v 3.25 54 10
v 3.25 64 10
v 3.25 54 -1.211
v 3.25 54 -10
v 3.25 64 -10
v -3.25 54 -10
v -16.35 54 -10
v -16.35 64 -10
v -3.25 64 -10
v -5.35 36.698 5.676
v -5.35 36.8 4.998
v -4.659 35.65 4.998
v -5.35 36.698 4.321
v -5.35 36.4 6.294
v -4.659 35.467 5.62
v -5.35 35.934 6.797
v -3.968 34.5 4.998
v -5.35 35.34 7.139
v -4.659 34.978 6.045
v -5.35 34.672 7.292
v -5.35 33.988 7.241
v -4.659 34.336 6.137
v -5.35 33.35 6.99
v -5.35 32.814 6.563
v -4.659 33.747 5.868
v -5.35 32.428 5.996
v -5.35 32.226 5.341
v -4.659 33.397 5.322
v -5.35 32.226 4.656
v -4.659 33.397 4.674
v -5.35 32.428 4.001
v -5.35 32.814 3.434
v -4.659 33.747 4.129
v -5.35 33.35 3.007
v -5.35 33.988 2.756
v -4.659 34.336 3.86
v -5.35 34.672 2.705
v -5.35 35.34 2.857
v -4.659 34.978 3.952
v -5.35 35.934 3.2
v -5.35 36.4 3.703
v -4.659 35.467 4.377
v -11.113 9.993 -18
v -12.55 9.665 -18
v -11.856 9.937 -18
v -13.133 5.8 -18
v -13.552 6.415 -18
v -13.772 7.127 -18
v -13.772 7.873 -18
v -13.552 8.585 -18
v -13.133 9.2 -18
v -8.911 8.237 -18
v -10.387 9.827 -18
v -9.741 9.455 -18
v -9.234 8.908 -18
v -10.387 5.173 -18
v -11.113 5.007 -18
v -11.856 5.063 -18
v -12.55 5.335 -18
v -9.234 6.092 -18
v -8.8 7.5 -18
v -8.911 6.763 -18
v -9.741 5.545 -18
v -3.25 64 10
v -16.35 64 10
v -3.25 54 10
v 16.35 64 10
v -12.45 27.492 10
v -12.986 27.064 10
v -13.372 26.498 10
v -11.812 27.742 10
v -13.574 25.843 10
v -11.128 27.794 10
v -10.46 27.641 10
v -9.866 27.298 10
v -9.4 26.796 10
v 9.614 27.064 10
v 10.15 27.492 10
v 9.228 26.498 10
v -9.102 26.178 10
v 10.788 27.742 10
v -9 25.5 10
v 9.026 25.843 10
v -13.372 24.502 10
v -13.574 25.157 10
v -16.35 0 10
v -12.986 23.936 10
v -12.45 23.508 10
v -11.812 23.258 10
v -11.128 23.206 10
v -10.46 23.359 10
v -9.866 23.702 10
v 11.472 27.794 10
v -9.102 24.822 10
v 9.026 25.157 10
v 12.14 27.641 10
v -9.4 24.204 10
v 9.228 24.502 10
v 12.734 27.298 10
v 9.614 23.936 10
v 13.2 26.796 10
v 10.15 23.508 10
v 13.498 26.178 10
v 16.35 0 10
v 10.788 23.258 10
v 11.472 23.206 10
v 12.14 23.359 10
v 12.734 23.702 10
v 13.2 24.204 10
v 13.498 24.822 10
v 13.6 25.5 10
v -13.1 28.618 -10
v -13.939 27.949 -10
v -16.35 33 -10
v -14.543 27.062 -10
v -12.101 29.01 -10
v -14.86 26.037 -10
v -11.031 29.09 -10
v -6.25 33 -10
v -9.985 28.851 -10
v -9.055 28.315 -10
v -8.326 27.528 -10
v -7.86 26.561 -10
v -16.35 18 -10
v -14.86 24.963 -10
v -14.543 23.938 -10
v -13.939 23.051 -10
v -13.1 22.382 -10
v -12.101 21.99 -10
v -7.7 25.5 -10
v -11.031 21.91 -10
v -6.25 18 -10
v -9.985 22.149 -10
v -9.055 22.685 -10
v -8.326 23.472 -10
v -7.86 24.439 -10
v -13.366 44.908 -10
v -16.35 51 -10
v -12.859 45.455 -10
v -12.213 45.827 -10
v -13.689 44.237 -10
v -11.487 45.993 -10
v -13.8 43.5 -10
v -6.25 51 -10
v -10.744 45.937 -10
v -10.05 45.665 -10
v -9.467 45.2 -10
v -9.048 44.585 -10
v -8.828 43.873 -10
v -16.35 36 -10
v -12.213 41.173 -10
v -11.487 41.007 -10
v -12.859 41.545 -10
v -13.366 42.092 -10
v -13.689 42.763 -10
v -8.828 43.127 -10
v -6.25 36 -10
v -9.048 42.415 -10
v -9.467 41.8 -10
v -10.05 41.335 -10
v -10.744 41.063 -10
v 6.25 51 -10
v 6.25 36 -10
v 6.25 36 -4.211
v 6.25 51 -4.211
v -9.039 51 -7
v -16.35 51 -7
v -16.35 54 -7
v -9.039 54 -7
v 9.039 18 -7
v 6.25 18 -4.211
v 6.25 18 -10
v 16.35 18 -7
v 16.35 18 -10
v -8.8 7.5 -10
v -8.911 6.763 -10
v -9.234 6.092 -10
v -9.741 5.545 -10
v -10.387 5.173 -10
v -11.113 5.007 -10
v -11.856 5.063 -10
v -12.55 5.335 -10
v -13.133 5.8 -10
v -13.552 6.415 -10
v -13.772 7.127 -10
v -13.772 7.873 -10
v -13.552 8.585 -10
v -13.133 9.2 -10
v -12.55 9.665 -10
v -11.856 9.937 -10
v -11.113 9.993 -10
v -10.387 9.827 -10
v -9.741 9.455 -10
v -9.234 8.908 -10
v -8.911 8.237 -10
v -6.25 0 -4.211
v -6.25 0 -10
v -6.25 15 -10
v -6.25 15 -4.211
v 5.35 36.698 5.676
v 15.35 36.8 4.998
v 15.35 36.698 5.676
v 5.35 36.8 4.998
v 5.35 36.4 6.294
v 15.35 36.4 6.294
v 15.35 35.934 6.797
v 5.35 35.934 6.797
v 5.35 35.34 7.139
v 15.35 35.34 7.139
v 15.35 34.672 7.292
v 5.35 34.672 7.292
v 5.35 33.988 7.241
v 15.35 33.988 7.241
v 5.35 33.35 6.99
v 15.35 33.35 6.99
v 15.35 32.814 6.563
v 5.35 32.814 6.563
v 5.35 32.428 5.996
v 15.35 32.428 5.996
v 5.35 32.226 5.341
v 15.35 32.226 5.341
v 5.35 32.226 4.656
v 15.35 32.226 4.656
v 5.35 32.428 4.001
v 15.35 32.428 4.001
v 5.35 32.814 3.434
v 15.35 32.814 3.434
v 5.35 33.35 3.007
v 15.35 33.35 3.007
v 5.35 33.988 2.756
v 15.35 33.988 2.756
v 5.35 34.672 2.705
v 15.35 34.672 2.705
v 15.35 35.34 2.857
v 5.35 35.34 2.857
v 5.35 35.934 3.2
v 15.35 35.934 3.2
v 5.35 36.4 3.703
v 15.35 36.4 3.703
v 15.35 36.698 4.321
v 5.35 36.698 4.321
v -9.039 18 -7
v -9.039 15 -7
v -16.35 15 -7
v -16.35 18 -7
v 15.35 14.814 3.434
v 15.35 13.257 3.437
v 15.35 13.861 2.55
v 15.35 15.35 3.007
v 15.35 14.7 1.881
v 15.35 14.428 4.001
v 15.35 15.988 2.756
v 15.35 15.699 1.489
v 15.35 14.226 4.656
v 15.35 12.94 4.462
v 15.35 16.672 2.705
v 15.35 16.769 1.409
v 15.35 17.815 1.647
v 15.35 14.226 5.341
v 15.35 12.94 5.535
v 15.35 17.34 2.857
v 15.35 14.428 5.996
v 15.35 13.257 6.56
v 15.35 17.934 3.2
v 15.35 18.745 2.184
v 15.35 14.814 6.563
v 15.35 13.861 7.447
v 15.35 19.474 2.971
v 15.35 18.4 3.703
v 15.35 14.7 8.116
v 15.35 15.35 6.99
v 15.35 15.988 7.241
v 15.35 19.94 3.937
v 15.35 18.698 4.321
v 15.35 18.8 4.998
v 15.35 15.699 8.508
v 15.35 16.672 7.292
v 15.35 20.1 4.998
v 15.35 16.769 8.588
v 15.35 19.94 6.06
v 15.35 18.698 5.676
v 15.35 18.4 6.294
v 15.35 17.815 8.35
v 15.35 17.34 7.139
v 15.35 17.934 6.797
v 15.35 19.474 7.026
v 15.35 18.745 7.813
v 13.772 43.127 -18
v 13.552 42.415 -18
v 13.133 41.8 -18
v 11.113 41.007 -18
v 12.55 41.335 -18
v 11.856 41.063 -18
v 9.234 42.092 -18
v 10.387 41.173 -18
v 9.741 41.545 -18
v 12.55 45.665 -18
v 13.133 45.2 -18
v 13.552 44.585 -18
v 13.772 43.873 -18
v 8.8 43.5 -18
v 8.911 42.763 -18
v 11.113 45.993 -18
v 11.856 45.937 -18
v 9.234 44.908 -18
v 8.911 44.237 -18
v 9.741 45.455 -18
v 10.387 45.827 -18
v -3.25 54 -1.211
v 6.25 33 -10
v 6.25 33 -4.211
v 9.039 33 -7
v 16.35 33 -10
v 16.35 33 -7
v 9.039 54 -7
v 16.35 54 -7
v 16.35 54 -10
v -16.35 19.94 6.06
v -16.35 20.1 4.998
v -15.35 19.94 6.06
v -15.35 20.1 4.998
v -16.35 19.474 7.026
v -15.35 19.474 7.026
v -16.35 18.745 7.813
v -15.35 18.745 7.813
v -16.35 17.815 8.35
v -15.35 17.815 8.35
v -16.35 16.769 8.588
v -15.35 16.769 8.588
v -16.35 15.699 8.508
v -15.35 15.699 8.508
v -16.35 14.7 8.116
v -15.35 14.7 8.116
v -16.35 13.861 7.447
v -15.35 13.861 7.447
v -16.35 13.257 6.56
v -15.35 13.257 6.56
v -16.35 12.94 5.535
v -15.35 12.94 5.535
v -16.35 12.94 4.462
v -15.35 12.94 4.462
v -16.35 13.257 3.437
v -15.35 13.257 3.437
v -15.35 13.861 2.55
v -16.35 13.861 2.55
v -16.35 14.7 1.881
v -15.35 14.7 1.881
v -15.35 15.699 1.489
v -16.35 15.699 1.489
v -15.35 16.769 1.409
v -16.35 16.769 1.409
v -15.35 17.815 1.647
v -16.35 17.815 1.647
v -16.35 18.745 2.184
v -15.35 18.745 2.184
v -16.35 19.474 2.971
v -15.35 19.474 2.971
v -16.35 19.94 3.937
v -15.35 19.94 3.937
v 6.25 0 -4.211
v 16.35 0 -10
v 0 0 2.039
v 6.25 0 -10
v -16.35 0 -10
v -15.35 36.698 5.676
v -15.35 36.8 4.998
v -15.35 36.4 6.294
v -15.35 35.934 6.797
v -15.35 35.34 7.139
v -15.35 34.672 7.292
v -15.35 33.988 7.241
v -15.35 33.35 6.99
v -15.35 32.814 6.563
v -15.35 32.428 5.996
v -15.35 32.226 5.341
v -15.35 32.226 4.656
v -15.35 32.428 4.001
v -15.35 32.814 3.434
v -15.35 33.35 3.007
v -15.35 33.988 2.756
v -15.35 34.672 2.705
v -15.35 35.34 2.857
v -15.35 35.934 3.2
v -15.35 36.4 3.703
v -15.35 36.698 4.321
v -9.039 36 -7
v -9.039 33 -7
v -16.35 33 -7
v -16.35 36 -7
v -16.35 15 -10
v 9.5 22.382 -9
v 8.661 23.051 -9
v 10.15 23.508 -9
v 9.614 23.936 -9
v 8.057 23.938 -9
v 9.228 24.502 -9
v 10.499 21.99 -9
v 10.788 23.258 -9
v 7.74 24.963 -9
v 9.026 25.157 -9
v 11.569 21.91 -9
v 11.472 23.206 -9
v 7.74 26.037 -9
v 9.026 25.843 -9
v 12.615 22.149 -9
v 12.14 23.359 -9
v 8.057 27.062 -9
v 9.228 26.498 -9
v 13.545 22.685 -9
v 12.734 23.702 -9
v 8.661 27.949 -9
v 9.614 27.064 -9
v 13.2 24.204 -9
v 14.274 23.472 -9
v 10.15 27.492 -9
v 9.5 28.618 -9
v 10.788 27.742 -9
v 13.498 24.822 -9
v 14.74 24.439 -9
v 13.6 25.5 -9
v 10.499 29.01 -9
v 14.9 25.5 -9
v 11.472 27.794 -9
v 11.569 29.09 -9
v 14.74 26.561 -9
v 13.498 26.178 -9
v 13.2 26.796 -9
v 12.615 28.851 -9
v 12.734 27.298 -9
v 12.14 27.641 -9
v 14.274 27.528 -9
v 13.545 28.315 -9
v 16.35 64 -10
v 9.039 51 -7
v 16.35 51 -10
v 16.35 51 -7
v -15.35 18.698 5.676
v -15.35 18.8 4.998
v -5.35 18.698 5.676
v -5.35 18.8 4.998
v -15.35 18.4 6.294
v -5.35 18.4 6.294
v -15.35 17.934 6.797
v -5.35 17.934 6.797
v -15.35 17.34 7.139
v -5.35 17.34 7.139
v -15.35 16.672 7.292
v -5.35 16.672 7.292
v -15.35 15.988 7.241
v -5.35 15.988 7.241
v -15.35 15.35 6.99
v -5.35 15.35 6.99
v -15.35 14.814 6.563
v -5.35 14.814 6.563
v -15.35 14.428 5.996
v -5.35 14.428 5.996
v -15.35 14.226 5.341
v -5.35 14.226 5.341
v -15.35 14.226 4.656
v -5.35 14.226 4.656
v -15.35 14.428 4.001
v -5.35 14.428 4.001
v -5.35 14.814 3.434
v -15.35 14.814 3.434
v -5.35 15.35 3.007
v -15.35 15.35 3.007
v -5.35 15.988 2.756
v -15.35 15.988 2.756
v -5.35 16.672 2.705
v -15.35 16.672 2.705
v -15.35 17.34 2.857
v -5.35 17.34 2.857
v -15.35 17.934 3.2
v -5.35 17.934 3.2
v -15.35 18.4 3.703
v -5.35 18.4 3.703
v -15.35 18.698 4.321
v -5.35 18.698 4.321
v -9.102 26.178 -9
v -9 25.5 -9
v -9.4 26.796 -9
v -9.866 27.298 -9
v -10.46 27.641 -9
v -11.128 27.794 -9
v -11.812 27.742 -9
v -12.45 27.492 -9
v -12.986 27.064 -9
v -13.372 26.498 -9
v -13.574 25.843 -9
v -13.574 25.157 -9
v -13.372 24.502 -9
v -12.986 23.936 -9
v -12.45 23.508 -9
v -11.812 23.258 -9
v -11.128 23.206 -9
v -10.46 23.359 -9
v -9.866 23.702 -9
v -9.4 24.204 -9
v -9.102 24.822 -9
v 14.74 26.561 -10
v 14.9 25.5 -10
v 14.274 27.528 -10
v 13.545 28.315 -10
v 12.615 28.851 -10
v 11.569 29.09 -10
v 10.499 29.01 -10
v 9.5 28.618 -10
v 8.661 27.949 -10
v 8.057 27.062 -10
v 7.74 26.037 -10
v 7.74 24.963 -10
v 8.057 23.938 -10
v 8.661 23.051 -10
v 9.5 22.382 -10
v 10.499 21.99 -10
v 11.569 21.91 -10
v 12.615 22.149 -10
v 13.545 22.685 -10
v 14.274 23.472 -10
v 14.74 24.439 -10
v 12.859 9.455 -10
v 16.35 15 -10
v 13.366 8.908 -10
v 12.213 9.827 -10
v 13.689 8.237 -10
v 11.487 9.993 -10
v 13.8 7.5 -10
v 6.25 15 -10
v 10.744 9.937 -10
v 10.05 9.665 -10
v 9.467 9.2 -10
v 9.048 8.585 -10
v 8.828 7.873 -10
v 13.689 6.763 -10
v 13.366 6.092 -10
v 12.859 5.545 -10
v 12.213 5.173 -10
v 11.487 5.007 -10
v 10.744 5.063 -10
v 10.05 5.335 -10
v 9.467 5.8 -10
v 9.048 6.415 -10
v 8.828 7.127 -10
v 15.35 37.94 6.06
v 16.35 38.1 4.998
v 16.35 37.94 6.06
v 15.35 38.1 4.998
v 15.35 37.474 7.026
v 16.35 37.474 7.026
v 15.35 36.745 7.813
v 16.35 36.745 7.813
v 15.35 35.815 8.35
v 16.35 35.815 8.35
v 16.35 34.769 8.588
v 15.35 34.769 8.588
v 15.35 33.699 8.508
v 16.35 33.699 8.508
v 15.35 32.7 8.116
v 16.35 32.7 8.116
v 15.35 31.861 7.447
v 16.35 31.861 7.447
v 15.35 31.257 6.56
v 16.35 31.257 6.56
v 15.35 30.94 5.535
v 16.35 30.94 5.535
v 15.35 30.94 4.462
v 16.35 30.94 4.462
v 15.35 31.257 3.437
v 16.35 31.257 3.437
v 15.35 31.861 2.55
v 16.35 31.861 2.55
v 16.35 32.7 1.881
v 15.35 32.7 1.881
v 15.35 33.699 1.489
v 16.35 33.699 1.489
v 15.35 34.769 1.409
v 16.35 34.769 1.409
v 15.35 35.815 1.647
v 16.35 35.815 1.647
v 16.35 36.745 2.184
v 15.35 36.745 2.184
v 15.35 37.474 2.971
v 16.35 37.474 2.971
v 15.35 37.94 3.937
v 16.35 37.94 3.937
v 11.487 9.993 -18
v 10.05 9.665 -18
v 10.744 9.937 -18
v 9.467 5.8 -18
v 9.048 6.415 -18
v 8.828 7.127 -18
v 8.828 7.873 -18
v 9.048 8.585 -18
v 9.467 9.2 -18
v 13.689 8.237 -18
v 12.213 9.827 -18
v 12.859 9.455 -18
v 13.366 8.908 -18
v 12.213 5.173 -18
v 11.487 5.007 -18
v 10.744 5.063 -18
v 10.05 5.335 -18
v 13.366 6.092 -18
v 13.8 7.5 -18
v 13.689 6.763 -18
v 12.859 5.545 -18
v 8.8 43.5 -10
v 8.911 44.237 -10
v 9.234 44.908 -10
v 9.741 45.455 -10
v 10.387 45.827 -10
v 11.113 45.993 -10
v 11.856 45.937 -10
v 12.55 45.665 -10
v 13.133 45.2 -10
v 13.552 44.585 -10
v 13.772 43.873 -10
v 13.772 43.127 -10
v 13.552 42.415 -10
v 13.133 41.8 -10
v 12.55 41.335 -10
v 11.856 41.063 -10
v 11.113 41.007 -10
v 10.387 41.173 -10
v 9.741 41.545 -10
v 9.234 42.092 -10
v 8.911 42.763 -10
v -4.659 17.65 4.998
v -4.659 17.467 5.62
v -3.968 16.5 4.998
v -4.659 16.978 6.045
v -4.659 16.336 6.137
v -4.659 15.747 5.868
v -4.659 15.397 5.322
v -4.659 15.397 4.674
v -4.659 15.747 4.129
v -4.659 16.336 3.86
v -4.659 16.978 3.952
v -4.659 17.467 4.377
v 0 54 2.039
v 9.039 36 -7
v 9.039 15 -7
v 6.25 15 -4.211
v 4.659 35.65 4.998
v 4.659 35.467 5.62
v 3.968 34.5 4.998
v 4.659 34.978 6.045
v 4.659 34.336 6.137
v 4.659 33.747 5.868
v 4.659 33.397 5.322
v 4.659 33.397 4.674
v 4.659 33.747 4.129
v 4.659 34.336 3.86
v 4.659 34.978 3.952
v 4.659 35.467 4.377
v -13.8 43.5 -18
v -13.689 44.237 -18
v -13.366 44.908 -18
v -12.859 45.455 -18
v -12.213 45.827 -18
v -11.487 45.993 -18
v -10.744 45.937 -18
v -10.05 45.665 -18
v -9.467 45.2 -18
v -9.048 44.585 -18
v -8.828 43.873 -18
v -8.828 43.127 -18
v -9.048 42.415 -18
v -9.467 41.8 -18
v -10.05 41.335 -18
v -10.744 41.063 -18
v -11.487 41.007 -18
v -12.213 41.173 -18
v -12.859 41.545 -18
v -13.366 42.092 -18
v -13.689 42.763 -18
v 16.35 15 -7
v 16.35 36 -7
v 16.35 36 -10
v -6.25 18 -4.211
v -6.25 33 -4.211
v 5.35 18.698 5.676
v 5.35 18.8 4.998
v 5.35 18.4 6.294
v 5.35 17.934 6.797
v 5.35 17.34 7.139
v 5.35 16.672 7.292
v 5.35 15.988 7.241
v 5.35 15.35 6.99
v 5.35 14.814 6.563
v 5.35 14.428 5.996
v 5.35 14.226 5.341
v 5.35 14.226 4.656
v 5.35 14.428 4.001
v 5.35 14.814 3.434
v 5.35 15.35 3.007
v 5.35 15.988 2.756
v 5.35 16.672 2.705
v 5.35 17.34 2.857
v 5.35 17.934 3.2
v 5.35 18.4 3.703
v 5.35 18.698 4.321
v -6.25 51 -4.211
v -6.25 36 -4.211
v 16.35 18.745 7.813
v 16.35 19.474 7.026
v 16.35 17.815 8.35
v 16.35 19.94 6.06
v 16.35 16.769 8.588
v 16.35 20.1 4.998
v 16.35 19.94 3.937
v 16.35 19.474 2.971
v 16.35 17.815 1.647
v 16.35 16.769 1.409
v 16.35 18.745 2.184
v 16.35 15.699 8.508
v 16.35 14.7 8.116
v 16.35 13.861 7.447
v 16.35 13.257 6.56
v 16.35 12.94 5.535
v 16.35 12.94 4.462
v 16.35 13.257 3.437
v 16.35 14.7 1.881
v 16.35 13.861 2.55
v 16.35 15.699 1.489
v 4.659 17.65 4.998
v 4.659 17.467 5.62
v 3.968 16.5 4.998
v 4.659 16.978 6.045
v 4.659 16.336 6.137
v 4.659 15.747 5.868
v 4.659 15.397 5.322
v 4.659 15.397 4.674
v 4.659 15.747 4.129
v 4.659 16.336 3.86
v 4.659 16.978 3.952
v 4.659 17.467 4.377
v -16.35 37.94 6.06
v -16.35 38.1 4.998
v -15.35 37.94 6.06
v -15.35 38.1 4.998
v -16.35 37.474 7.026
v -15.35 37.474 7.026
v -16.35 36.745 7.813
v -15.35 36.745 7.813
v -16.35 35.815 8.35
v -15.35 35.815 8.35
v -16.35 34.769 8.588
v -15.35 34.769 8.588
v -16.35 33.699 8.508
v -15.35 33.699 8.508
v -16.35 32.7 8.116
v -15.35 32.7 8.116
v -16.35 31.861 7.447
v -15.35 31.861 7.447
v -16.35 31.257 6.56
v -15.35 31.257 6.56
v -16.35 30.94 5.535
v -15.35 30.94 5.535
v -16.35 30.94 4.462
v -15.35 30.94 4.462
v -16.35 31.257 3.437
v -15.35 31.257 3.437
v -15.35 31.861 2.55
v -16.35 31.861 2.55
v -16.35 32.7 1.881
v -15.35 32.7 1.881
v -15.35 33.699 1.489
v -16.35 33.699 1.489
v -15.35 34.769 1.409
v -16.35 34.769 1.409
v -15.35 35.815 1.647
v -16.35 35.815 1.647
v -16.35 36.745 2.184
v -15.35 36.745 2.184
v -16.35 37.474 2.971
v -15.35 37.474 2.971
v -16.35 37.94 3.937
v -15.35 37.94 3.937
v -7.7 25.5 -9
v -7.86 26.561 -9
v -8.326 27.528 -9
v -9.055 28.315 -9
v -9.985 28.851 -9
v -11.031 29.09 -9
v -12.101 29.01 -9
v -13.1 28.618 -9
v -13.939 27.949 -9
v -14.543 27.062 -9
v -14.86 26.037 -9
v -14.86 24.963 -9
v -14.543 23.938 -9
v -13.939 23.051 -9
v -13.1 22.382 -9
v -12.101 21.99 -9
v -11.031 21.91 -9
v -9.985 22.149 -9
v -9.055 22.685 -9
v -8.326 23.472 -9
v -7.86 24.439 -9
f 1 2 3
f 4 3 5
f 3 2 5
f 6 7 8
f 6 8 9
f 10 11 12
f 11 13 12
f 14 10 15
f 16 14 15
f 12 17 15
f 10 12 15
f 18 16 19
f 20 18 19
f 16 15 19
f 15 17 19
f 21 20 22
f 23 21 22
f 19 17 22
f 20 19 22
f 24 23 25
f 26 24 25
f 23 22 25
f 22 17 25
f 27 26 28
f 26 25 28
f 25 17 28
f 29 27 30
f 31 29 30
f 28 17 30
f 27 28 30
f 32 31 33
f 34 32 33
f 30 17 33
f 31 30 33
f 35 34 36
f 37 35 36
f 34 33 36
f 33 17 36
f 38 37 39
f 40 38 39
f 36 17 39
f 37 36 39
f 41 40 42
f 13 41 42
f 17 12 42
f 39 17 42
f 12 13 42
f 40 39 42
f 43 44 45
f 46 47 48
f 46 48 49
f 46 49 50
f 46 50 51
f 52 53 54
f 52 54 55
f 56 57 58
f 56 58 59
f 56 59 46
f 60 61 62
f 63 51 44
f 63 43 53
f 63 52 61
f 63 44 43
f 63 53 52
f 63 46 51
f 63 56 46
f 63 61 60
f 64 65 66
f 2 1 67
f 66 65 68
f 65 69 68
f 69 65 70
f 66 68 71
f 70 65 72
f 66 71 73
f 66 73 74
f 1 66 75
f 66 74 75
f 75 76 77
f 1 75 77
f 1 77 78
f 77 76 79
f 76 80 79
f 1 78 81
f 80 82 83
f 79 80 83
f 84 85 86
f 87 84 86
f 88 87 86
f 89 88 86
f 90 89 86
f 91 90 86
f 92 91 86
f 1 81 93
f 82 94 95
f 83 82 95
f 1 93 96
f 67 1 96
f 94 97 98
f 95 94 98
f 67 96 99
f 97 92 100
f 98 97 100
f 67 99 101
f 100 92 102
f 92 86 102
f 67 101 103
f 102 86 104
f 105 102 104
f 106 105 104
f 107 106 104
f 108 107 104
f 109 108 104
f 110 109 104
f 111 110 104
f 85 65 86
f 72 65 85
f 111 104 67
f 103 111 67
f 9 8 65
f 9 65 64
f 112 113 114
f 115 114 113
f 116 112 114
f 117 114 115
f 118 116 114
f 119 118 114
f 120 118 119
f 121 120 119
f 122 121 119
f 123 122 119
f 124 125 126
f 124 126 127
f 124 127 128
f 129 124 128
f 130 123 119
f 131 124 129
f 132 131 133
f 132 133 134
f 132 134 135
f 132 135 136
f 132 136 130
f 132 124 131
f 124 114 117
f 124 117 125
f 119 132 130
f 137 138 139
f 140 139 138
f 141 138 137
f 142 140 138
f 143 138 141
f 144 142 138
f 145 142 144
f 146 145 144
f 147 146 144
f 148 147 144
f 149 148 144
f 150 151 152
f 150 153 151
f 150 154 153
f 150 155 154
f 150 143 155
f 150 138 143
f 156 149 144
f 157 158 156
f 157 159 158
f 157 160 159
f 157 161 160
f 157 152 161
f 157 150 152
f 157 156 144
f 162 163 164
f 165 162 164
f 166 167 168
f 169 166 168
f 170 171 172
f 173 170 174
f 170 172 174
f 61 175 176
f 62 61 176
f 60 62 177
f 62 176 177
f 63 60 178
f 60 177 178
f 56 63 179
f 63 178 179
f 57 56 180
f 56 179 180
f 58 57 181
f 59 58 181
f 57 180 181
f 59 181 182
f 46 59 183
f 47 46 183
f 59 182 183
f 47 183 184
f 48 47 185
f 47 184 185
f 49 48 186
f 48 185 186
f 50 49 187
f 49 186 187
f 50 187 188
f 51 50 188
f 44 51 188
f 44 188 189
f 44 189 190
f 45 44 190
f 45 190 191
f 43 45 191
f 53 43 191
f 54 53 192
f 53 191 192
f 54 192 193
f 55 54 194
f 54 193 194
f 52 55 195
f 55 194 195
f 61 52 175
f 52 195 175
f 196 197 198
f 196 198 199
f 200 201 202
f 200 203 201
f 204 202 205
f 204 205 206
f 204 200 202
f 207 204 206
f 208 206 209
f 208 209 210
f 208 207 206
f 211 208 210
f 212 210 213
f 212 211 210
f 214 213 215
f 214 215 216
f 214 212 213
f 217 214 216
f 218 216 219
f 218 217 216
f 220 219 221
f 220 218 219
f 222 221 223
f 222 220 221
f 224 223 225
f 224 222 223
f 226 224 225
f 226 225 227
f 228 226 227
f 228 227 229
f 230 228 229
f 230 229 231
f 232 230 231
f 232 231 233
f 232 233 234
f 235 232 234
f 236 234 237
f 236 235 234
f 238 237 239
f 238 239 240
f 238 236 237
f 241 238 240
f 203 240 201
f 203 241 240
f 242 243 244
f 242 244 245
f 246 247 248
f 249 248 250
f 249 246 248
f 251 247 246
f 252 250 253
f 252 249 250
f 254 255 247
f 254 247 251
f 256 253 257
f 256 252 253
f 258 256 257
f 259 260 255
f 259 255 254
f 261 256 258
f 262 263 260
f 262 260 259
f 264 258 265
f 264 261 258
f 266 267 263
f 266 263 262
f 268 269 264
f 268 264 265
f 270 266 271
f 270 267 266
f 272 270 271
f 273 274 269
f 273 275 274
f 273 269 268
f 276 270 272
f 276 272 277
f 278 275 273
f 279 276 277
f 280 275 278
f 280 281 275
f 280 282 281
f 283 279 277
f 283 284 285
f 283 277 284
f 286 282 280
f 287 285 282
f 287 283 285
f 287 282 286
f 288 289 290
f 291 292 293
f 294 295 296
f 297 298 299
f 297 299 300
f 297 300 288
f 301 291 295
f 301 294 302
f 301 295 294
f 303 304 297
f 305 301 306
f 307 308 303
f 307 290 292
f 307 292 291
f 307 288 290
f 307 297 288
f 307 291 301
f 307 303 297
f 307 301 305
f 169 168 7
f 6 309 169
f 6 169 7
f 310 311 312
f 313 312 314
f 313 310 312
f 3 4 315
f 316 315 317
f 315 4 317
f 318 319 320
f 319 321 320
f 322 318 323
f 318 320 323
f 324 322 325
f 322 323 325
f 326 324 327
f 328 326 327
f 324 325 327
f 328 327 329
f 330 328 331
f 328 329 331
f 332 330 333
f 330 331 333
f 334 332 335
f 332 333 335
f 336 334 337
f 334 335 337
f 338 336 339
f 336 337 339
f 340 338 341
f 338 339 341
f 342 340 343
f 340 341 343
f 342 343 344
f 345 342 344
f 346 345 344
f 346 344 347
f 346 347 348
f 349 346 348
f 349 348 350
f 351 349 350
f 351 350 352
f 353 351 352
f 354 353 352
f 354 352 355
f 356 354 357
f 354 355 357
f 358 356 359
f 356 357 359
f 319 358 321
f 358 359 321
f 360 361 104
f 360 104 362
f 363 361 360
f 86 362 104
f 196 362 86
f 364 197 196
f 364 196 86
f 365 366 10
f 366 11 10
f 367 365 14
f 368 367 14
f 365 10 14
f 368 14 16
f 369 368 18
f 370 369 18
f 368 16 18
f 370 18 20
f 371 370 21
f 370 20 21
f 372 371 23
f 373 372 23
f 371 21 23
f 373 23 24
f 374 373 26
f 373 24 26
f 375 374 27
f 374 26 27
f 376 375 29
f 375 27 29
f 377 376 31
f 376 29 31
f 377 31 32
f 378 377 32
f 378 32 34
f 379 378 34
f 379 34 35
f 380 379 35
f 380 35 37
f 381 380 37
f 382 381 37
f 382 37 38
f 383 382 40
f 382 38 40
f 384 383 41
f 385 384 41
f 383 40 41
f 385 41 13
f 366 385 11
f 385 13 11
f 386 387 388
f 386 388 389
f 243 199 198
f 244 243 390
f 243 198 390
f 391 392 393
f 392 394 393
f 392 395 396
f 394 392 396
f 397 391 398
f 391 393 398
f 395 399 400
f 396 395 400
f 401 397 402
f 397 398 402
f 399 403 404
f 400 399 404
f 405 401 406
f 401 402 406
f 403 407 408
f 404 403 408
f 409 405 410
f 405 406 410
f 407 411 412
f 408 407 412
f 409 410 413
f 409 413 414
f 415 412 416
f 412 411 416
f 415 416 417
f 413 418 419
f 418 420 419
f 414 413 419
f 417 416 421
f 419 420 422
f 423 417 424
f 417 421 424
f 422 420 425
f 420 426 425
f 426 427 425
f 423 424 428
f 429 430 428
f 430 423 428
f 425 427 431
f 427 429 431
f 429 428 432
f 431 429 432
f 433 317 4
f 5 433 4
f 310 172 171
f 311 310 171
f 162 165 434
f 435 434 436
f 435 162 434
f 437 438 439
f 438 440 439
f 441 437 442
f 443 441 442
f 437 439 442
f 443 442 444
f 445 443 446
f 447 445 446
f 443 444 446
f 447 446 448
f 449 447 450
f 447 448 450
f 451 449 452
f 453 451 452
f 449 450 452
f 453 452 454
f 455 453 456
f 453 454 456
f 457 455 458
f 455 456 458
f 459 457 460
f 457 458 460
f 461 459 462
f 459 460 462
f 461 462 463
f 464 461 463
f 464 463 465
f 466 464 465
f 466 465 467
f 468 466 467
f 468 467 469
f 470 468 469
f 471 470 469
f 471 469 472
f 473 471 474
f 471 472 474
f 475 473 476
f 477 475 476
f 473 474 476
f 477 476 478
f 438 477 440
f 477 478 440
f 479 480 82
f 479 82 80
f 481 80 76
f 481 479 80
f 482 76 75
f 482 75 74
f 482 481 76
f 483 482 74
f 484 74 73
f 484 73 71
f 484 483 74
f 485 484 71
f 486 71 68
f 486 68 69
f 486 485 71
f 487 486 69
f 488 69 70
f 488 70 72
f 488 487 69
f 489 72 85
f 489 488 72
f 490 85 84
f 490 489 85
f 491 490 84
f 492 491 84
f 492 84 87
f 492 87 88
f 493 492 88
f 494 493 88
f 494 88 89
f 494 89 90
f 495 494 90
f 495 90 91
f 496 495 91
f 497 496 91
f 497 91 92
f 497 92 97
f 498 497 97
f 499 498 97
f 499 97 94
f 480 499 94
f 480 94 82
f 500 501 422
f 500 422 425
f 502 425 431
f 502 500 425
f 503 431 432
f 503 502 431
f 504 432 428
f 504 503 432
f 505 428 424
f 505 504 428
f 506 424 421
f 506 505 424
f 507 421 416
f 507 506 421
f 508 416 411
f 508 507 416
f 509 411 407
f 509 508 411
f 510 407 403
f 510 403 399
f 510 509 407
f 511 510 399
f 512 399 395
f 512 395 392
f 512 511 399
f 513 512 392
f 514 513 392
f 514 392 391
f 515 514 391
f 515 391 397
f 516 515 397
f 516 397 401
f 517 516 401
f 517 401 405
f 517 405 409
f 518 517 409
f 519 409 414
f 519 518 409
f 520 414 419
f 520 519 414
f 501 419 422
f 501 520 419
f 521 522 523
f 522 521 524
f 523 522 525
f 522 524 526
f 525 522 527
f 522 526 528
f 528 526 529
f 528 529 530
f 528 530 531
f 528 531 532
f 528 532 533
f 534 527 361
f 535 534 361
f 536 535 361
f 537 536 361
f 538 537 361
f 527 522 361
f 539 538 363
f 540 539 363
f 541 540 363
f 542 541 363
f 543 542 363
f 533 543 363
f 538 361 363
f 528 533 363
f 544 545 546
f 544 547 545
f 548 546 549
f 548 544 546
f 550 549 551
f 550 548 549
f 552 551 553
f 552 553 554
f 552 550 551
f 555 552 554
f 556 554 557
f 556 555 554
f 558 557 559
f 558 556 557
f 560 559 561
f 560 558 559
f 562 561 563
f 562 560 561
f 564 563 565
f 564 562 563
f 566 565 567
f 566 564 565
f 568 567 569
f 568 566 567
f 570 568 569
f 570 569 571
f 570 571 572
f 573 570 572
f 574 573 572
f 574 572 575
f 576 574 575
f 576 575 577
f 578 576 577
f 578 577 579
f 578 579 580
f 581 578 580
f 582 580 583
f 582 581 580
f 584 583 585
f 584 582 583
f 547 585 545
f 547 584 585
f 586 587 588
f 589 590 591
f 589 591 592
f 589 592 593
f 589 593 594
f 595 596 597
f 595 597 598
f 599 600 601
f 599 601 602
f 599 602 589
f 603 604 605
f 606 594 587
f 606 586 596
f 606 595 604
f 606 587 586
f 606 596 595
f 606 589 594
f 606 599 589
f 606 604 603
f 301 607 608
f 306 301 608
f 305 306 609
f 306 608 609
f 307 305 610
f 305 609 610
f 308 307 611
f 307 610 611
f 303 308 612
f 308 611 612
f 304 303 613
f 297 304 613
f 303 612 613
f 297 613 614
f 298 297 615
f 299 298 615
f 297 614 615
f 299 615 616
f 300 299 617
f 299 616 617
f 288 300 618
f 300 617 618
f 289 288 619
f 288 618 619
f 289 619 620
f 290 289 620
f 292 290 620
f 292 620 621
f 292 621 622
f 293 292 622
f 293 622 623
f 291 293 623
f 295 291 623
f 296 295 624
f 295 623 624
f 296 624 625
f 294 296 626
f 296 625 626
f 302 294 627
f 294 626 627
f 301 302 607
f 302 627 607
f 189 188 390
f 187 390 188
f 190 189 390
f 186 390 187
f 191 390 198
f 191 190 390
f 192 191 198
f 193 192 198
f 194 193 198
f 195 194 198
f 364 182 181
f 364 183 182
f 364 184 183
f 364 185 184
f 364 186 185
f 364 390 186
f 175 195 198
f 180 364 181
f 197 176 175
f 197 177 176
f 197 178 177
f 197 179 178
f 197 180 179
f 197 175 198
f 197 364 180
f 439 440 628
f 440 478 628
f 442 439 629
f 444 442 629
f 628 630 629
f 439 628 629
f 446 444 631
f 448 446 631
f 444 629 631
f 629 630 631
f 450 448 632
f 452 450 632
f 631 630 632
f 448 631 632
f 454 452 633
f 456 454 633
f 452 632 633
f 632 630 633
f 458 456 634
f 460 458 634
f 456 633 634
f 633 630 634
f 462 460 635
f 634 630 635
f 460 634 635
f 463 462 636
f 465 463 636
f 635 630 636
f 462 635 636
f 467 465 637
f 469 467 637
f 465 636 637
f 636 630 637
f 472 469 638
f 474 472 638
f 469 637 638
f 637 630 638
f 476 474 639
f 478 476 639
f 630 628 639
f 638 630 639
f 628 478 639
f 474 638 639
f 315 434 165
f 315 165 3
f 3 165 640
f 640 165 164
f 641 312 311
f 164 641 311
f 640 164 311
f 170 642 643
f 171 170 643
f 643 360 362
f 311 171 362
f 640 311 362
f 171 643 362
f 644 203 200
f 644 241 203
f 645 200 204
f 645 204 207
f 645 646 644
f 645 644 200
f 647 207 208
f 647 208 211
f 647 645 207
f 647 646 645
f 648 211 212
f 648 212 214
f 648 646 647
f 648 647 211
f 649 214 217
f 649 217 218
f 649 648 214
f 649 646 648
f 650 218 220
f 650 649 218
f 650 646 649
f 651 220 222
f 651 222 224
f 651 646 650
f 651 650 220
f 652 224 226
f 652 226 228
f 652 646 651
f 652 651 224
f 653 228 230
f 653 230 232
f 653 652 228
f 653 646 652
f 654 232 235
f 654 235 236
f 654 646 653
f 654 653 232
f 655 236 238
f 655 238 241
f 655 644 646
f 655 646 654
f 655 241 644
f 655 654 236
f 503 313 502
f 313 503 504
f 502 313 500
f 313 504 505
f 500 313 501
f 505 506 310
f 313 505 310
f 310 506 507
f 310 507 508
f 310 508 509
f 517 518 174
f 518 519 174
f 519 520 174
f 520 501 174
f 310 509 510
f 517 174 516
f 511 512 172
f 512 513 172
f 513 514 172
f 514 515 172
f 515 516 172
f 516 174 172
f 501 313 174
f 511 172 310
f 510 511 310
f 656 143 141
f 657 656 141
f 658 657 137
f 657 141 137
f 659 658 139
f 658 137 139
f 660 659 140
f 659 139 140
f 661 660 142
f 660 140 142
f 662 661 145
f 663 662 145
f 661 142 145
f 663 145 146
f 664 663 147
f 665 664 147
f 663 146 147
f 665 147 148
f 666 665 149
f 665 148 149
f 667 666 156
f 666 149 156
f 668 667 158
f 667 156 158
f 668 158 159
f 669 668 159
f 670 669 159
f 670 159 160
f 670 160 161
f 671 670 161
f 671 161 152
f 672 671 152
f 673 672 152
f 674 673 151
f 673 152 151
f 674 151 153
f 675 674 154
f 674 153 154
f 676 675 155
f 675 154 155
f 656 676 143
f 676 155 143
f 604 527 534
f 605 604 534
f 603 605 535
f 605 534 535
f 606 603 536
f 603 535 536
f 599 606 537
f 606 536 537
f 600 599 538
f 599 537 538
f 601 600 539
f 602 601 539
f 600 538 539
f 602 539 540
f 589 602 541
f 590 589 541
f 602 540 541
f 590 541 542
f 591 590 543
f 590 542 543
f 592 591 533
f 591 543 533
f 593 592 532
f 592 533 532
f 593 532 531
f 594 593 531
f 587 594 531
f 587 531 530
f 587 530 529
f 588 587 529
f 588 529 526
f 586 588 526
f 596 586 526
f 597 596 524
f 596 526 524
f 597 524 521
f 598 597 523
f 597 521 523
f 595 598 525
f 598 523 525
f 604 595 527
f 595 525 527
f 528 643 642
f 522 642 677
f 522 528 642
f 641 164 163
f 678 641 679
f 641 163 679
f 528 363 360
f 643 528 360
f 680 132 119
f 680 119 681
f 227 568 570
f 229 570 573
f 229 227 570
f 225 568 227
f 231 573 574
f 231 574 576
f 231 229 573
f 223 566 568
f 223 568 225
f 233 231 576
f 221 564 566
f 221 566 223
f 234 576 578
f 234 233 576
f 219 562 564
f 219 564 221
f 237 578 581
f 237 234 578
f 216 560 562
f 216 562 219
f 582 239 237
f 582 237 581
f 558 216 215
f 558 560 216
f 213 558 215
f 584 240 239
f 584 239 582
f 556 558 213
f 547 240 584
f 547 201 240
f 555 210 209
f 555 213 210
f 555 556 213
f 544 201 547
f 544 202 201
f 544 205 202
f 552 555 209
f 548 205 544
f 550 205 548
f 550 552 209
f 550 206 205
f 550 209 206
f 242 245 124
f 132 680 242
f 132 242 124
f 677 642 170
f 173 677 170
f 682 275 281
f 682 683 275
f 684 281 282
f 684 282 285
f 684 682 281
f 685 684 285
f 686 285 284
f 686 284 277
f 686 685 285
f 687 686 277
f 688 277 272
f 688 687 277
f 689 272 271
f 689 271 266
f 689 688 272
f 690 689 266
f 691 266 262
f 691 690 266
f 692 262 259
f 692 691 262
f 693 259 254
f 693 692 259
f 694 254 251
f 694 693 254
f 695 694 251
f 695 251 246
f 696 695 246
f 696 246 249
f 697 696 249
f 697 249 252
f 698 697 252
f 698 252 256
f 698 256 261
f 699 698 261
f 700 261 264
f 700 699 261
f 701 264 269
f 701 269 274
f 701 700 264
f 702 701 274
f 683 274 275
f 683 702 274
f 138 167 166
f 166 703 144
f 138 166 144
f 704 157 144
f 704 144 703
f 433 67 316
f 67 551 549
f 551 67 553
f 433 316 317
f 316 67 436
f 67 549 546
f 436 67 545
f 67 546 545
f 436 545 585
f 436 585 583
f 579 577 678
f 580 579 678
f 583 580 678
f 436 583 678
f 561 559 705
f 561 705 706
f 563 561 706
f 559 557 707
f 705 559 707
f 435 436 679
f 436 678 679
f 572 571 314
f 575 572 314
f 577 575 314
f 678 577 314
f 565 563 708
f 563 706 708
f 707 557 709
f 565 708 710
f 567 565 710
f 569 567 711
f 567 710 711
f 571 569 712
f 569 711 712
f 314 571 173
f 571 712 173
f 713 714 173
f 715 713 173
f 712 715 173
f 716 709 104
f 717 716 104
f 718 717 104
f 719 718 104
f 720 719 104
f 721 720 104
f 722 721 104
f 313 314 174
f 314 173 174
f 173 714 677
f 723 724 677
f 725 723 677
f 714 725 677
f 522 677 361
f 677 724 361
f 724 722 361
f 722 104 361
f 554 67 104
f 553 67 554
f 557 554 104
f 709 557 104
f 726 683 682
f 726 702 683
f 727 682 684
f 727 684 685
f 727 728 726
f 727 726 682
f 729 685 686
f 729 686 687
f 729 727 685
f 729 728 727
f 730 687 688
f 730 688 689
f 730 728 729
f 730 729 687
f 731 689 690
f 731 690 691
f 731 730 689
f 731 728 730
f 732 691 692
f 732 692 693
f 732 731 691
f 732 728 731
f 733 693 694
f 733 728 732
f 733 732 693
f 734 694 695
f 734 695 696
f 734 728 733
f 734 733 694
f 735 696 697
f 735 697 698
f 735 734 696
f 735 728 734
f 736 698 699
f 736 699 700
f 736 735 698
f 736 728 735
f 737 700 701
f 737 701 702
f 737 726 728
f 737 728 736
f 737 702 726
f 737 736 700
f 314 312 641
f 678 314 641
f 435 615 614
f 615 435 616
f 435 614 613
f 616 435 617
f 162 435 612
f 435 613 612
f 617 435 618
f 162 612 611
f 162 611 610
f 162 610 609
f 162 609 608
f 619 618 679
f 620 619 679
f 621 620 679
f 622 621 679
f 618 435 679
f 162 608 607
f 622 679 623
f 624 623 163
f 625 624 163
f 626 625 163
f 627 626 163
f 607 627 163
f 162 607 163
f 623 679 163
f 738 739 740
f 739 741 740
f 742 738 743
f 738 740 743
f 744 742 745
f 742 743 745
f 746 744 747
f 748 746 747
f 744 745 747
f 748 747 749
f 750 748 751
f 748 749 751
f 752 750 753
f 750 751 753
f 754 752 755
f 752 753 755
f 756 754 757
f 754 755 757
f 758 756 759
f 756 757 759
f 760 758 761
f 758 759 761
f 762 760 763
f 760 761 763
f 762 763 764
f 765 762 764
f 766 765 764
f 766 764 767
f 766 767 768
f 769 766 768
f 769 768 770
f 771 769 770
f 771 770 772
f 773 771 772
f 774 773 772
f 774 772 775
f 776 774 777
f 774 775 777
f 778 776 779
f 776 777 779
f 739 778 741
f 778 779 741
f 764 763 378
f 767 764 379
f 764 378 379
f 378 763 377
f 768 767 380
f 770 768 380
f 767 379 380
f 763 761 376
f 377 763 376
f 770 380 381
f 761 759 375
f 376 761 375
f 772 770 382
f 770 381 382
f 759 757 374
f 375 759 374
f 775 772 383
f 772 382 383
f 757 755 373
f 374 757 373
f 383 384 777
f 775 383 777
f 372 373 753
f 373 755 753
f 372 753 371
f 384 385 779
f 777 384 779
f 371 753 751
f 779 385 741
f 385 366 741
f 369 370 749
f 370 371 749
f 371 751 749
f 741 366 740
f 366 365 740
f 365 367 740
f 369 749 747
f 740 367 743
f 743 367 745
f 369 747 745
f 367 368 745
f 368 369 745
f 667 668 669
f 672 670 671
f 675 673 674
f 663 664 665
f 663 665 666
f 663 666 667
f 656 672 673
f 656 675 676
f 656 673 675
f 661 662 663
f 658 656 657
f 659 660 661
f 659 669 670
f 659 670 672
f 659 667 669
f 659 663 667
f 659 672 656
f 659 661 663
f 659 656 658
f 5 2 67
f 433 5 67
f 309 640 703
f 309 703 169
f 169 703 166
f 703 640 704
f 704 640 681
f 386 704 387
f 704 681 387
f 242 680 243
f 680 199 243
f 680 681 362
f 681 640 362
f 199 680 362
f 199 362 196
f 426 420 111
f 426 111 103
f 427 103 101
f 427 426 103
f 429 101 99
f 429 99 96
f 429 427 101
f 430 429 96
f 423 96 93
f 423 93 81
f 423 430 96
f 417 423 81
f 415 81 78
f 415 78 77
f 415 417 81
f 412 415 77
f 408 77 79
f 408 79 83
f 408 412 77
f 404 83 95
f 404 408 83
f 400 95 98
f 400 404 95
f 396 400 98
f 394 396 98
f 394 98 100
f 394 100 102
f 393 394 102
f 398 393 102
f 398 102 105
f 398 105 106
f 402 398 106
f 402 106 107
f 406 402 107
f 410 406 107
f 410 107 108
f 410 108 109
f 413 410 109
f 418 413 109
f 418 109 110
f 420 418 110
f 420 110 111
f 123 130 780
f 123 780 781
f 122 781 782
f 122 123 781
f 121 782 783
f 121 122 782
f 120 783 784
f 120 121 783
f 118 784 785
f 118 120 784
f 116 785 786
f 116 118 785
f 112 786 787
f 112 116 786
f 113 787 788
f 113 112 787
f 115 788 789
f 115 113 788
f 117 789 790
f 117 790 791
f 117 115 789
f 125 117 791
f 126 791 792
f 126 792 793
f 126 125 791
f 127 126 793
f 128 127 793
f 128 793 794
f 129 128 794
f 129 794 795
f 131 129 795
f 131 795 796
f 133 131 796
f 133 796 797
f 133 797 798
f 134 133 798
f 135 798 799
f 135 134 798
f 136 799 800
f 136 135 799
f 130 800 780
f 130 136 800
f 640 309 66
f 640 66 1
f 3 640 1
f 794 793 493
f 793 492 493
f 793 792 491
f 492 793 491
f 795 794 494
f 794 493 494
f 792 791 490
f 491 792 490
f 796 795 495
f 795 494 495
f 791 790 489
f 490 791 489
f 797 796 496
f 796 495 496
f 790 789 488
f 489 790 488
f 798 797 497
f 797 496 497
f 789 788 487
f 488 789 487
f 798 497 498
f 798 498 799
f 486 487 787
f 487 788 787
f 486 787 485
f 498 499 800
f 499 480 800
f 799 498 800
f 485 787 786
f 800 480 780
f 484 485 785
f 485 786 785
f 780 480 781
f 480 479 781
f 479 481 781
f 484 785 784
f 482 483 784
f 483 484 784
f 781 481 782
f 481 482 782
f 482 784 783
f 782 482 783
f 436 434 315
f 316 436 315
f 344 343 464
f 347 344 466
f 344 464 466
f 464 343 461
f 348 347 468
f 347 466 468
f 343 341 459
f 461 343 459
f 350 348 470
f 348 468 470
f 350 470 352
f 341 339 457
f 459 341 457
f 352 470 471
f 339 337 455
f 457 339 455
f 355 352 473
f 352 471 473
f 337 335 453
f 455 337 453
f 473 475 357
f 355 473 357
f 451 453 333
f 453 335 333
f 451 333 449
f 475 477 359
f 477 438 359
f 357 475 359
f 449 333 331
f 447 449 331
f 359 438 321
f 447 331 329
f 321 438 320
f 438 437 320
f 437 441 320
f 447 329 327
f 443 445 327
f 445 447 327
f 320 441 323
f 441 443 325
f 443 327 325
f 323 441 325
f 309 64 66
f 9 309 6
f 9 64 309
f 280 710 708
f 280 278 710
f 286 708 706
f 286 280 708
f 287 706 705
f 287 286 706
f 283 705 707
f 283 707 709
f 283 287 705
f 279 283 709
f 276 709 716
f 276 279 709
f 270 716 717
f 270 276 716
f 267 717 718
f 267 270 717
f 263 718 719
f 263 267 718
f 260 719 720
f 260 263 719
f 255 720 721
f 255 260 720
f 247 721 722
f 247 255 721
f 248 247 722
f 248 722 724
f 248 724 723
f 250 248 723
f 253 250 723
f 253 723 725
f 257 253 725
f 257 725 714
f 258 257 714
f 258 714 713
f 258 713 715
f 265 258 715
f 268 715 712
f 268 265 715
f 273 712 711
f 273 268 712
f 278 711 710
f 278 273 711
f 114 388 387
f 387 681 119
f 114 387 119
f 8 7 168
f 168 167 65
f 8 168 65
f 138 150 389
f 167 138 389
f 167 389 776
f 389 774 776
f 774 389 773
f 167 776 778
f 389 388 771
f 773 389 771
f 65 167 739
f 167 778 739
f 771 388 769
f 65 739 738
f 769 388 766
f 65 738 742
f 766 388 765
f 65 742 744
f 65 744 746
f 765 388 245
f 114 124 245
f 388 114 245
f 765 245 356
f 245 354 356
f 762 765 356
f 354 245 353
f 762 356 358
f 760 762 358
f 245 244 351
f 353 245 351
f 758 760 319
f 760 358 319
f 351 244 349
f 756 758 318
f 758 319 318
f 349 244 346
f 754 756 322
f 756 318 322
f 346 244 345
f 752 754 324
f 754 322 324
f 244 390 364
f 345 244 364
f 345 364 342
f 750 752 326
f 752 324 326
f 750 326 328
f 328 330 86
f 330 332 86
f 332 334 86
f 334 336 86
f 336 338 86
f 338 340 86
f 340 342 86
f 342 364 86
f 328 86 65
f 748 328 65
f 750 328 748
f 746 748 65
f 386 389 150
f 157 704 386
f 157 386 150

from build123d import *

# Parameters (mm, degrees)
EXTRUDE_1_DEPTH        = 54
EXTRUDE_2_DEPTH        = 10
SKETCH_3_W             = 6.5
SKETCH_3_H             = 20
CUT_EXTRUDE_1_DEPTH    = 10
EXTRUDE_3_DEPTH        = 15
EXTRUDE_4_DEPTH        = 15
PATTERN_LINEAR_6_COUNT = 2
PATTERN_LINEAR_6_PITCH = 18
SKETCH_8_W             = 3
SKETCH_8_H             = 3
CUT_EXTRUDE_2_DEPTH    = 73.562318045
SKETCH_9_R             = 2.5
EXTRUDE_5_DEPTH        = 8
OTHER_START            = -10
OTHER_1_OUTLINE_R      = 2.3
OTHER_1_DEPTH          = 20
OTHER_1_2_OUTLINE_R    = 3.6
OTHER_1_2_OUTLINE_R_2  = 2.3
OTHER_1_2_DEPTH        = 1


# Read off the part's stored shape, not the designer's step: 高级异型孔1, 高级异型孔2
with BuildPart() as part:
    # 草图1 → 凸台-拉伸1 (new body)
    with BuildSketch(Plane(origin=(0, 0, 0), x_dir=(1, 0, 0), z_dir=(0, 1, 0))):
        Polygon((-12.038834765, 10), (-16.35, 10), (-16.35, -10), (16.35, -10), (16.35, 10), (12.038834765, 10), (0, -2.038834765), align=None)
    extrude(amount=EXTRUDE_1_DEPTH)

    # 草图2 → 凸台-拉伸2 (add)
    with BuildSketch(Plane(origin=(0, 54, 0), x_dir=(1, 0, 0), z_dir=(0, 1, 0))):
        Polygon((16.35, 10), (12.038834765, 10), (0, -2.038834765), (-12.038834765, 10), (-16.35, 10), (-16.35, -10), (16.35, -10), align=None)
        Polygon((12.038834765, 10), (-12.038834765, 10), (0, -2.038834765), align=None)
    extrude(amount=EXTRUDE_2_DEPTH)

    # 草图3 → 切除-拉伸1 (cut)
    with BuildSketch(Plane(origin=(0, 64, 0), x_dir=(1, 0, 0), z_dir=(0, 1, 0))):
        Rectangle(SKETCH_3_W, SKETCH_3_H)
    extrude(amount=-CUT_EXTRUDE_1_DEPTH, mode=Mode.SUBTRACT)

    # 草图5 → 凸台-拉伸3 (add)
    with BuildSketch(Plane(origin=(0, 0, 0), x_dir=(-1, 0, 0), z_dir=(0, -1, 0))):
        Polygon((6.25, 4.211165235), (12.038834765, 10), (6.25, 10), align=None)
        Polygon((-6.25, 4.211165235), (-12.038834765, 10), (-6.25, 10), align=None)
    extrude(amount=-EXTRUDE_3_DEPTH)

    # 草图6 → 凸台-拉伸4 (add)
    with BuildSketch(Plane(origin=(0, 18, 0), x_dir=(1, 0, 0), z_dir=(0, 1, 0))):
        Polygon((12.038834765, 10), (6.25, 10), (6.25, 4.211165235), align=None)
        Polygon((-6.25, 4.211165235), (-12.038834765, 10), (-6.25, 10), align=None)
    extrude_4 = extrude(amount=EXTRUDE_4_DEPTH)

    # 阵列(线性)6: 凸台-拉伸4 ×2
    with Locations(*[(0, i * PATTERN_LINEAR_6_PITCH, 0) for i in range(1, PATTERN_LINEAR_6_COUNT)]):
        add(extrude_4)

    # 草图8 → 切除-拉伸2 (cut, through all)
    with BuildSketch(Plane(origin=(16.35, 0, 0), x_dir=(0, 0, -1), z_dir=(1, 0, 0))):
        with Locations((8.5, 52.5)):
            Rectangle(SKETCH_8_W, SKETCH_8_H)
        with Locations((8.5, 34.5)):
            Rectangle(SKETCH_8_W, SKETCH_8_H)
        with Locations((8.5, 16.5)):
            Rectangle(SKETCH_8_W, SKETCH_8_H)
    extrude(amount=-CUT_EXTRUDE_2_DEPTH, mode=Mode.SUBTRACT)

    # 草图9 → 凸台-拉伸5 (add)
    with BuildSketch(Plane(origin=(0, 0, -10), x_dir=(-1, 0, 0), z_dir=(0, 0, -1))):
        with Locations((-11.3, 43.5)):
            Circle(SKETCH_9_R)
        with Locations((11.3, 43.5)):
            Circle(SKETCH_9_R)
        with Locations(Location((11.3, 7.5, 0), (0, 0, 180))):
            Circle(SKETCH_9_R)
        with Locations(Location((-11.3, 7.5, 0), (0, 0, 180))):
            Circle(SKETCH_9_R)
    extrude(amount=EXTRUDE_5_DEPTH)

    # 高级异型孔1 outline → 高级异型孔1 (cut)
    with BuildSketch(Plane.XY.offset(OTHER_START)):
        with Locations((-11.3, 25.5)):
            Circle(OTHER_1_OUTLINE_R)
        with Locations((11.3, 25.5)):
            Circle(OTHER_1_OUTLINE_R)
    extrude(amount=OTHER_1_DEPTH, mode=Mode.SUBTRACT)

    # Other 1 2 outline → Other 1 2 (cut)
    # profile 1 of 2: a face of its own
    with BuildSketch(Plane.XY.offset(OTHER_START)):
        with Locations((-11.3, 25.5)):
            Circle(OTHER_1_2_OUTLINE_R)
        with Locations((-11.3, 25.5)):
            Circle(OTHER_1_2_OUTLINE_R_2, mode=Mode.SUBTRACT)
    # profile 2 of 2: a face of its own
    with BuildSketch(Plane.XY.offset(OTHER_START)):
        with Locations((11.3, 25.5)):
            Circle(OTHER_1_2_OUTLINE_R)
        with Locations((11.3, 25.5)):
            Circle(OTHER_1_2_OUTLINE_R_2, mode=Mode.SUBTRACT)
    extrude(amount=OTHER_1_2_DEPTH, mode=Mode.SUBTRACT)

    # 高级异型孔2 outline → 高级异型孔2 (revolve, cut)
    with BuildSketch(Plane(origin=(0, 34.5, 4.998489893), x_dir=(0, 1, 0), z_dir=(0, 0, -1))):
        Polygon((3.6, -16.35), (3.6, -15.35), (2.3, -15.35), (2.3, -5.35), (0, -3.96802058), (0, -16.35), align=None)
    other_2 = revolve(axis=Axis((0, 34.5, 4.998489893), (1, 0, 0)), mode=Mode.SUBTRACT)

    # Other 2 2 outline → Other 2 2 (revolve, cut)
    with BuildSketch(Plane(origin=(0, 16.5, 4.998489893), x_dir=(0, 1, 0), z_dir=(0, 0, -1))):
        Polygon((0, -16.35), (3.6, -16.35), (3.6, -15.35), (2.3, -15.35), (2.3, -5.35), (0, -3.96802058), align=None)
    other_2_2 = revolve(axis=Axis((0, 16.5, 4.998489893), (1, 0, 0)), mode=Mode.SUBTRACT)

    # 镜向1: 高级异型孔2, Other 2 2 across plane
    add(other_2.mirror(Plane(origin=(0, 0, 0), x_dir=(0, 0, 1), z_dir=(1, 0, 0))), mode=Mode.SUBTRACT)
    add(other_2_2.mirror(Plane(origin=(0, 0, 0), x_dir=(0, 0, 1), z_dir=(1, 0, 0))), mode=Mode.SUBTRACT)


solid = part.part
